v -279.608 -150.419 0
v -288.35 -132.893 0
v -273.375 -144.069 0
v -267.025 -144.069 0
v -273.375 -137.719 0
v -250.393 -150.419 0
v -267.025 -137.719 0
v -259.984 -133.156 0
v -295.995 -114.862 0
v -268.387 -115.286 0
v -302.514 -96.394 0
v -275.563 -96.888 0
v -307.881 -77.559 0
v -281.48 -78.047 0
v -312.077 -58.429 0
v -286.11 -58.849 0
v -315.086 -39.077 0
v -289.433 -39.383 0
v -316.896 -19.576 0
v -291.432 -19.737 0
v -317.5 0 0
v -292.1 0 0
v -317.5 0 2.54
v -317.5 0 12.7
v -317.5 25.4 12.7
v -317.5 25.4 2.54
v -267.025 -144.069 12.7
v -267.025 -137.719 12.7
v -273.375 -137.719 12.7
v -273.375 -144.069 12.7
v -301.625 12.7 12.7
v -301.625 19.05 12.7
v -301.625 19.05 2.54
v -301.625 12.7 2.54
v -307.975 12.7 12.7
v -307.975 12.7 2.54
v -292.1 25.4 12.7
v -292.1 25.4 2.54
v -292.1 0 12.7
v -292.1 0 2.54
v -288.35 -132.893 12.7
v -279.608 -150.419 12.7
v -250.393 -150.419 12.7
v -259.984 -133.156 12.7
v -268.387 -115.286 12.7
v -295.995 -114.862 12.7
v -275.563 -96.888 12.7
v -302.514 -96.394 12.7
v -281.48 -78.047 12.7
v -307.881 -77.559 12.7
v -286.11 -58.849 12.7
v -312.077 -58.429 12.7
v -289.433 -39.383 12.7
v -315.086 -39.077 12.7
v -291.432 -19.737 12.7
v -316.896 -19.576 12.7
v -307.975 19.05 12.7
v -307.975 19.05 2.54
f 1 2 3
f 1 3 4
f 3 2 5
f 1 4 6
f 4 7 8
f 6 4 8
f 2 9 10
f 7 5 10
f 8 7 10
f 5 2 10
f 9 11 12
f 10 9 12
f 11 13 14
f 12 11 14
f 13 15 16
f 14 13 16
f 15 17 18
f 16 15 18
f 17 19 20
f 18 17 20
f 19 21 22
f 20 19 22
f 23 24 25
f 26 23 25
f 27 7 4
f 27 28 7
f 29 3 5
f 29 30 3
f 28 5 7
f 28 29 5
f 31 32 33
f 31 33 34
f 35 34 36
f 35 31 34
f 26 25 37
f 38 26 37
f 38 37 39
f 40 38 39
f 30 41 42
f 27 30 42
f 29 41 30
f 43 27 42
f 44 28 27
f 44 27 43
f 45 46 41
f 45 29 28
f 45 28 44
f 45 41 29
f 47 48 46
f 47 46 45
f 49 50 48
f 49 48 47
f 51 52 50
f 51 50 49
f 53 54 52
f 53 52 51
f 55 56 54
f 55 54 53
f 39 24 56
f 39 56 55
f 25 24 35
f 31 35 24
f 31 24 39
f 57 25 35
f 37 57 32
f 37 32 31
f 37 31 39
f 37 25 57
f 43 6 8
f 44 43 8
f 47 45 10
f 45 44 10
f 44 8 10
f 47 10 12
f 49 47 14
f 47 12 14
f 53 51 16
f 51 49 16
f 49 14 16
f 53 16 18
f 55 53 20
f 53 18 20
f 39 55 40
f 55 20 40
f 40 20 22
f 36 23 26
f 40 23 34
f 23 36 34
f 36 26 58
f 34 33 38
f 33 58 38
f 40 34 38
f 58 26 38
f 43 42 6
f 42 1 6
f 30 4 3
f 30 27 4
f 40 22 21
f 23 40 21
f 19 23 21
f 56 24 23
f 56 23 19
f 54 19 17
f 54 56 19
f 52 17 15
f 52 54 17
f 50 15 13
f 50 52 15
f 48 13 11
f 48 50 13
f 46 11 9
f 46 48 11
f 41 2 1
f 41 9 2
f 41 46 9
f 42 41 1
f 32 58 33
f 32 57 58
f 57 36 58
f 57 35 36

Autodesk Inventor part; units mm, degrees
ref_plane "YZ Plane" through (0, 0, 0) normal (1, 0, 0) x (0, 1, 0)
ref_plane "XZ Plane" through (0, 0, 0) normal (0, 1, 0) x (-1, 0, 0)
ref_plane "XY Plane" through (0, 0, 0) normal (0, 0, 1) x (1, 0, 0)
sketch "Sketch1" plane through (0, 0, 0) normal (0, 0, 1) x (1, 0, 0)
  circle A0 centre (0, 0) radius 292.1
  line L0 (-292.1, 0) -> (-266.7, 0)
  line L1 (-292.1, 0) -> (-317.5, 0)
  circle A1 centre (0, 0) radius 317.5
  line L2 (-317.5, 0) -> (-317.5, -150.4188)
  line L3 (-317.5, -150.4188) -> (-250.3929, -150.4188)
  circle A2 centre (0, 0) radius 317.5
  dimension "d0" = 584.2
  dimension "d1" = 25.4
  dimension "d2" = 25.4
  dimension "d3" = 150.4188
extrude "Extrusion1" add sketch "Sketch1" along normal blind 12.7 contours A0 L3 A1 L1 | A1 L3 L2 picked at (-273.7775, -123.6883)
sketch "Sketch2" plane through (0, 0, 12.7) normal (0, 0, 1) x (1, 0, 0)
  line L0 (-317.5, 0) -> (-317.5, -150.4188) projected
  line L1 (-317.5, -150.4188) -> (-250.3929, -150.4188) projected
  arc A0 (-292.1, 0) -> (-250.3929, -150.4188) centre (0, 0) ccw projected
  circle A1 centre (0, 0) radius 292.1
  circle A2 centre (0, 0) radius 317.5
  line L2 (-317.5, 0) -> (-317.5, -150.4188)
  line L3 (-317.5, -150.4188) -> (-279.6076, -150.4188)
extrude "Extrusion2" cut sketch "Sketch2" against normal blind 25.4 contours A2 L1 L0
sketch "Sketch3" plane through (0, 0, 12.7) normal (0, 0, 1) x (1, 0, 0)
  arc A0 (-317.5, 0) -> (-279.6076, -150.4188) centre (0, 0) ccw projected
  arc A1 (-292.1, 0) -> (-250.3929, -150.4188) centre (0, 0) ccw projected
  line L0 (-279.6076, -150.4188) -> (-304.8, -150.4188)
  line L1 (-284.5263, -140.8938) -> (-284.5263, -150.4188)
  line L2 (-284.5263, -140.8938) -> (-255.8737, -140.8938)
  line L3 (-270.2, -137.7188) -> (-267.025, -137.7188)
  line L4 (-267.025, -137.7188) -> (-267.025, -144.0688)
  line L5 (-267.025, -144.0688) -> (-273.375, -144.0688)
  line L6 (-273.375, -144.0688) -> (-273.375, -137.7188)
  line L7 (-273.375, -137.7188) -> (-270.2, -137.7188)
  dimension "d14" = 9.525
  dimension "d16" = 3.175
  dimension "d17" = 6.35
  dimension "d18" = 6.35
  dimension "d19" = 3.175
  dimension "d20" = 4.9186
  dimension "d21" = 11.1513
extrude "Extrusion3" cut sketch "Sketch3" against normal blind 25.4
sketch "Sketch4" plane through (0, 0, 12.7) normal (0, 0, 1) x (1, 0, 0)
  arc A0 (-317.5, 0) -> (-279.6076, -150.4188) centre (0, 0) ccw projected
  arc A1 (-292.1, 0) -> (-250.3929, -150.4188) centre (0, 0) ccw projected
  line L0 (-292.1, 0) -> (-317.5, 0) projected
  line L1 (-317.5, 0) -> (-317.5, 25.4)
  line L2 (-317.5, 25.4) -> (-292.1, 25.4)
  line L3 (-292.1, 25.4) -> (-292.1, 0)
  line L4 (-317.5, 0) -> (-292.1, 0)
  dimension "d24" = 25.4
extrude "Extrusion4" add sketch "Sketch4" against normal blind 10.16
sketch "Sketch5" plane through (0, 0, 12.7) normal (0, 0, 1) x (1, 0, 0)
  line L0 (-292.1, 0) -> (-292.1, 25.4) projected
  line L1 (-292.1, 25.4) -> (-317.5, 25.4) projected
  line L2 (-317.5, 25.4) -> (-317.5, 0) projected
  line L3 (-304.8, 25.4) -> (-304.8, 19.05)
  line L4 (-304.8, 19.05) -> (-301.625, 19.05)
  line L5 (-301.625, 19.05) -> (-301.625, 12.7)
  line L6 (-301.625, 12.7) -> (-307.975, 12.7)
  line L7 (-307.975, 12.7) -> (-307.975, 19.05)
  line L8 (-307.975, 19.05) -> (-304.8, 19.05)
  dimension "d27" = 6.35
  dimension "d28" = 3.175
  dimension "d29" = 6.35
  dimension "d30" = 6.35
extrude "Extrusion5" cut sketch "Sketch5" against normal blind 10.16
properties part number "HopperFrontSupport_v1"
